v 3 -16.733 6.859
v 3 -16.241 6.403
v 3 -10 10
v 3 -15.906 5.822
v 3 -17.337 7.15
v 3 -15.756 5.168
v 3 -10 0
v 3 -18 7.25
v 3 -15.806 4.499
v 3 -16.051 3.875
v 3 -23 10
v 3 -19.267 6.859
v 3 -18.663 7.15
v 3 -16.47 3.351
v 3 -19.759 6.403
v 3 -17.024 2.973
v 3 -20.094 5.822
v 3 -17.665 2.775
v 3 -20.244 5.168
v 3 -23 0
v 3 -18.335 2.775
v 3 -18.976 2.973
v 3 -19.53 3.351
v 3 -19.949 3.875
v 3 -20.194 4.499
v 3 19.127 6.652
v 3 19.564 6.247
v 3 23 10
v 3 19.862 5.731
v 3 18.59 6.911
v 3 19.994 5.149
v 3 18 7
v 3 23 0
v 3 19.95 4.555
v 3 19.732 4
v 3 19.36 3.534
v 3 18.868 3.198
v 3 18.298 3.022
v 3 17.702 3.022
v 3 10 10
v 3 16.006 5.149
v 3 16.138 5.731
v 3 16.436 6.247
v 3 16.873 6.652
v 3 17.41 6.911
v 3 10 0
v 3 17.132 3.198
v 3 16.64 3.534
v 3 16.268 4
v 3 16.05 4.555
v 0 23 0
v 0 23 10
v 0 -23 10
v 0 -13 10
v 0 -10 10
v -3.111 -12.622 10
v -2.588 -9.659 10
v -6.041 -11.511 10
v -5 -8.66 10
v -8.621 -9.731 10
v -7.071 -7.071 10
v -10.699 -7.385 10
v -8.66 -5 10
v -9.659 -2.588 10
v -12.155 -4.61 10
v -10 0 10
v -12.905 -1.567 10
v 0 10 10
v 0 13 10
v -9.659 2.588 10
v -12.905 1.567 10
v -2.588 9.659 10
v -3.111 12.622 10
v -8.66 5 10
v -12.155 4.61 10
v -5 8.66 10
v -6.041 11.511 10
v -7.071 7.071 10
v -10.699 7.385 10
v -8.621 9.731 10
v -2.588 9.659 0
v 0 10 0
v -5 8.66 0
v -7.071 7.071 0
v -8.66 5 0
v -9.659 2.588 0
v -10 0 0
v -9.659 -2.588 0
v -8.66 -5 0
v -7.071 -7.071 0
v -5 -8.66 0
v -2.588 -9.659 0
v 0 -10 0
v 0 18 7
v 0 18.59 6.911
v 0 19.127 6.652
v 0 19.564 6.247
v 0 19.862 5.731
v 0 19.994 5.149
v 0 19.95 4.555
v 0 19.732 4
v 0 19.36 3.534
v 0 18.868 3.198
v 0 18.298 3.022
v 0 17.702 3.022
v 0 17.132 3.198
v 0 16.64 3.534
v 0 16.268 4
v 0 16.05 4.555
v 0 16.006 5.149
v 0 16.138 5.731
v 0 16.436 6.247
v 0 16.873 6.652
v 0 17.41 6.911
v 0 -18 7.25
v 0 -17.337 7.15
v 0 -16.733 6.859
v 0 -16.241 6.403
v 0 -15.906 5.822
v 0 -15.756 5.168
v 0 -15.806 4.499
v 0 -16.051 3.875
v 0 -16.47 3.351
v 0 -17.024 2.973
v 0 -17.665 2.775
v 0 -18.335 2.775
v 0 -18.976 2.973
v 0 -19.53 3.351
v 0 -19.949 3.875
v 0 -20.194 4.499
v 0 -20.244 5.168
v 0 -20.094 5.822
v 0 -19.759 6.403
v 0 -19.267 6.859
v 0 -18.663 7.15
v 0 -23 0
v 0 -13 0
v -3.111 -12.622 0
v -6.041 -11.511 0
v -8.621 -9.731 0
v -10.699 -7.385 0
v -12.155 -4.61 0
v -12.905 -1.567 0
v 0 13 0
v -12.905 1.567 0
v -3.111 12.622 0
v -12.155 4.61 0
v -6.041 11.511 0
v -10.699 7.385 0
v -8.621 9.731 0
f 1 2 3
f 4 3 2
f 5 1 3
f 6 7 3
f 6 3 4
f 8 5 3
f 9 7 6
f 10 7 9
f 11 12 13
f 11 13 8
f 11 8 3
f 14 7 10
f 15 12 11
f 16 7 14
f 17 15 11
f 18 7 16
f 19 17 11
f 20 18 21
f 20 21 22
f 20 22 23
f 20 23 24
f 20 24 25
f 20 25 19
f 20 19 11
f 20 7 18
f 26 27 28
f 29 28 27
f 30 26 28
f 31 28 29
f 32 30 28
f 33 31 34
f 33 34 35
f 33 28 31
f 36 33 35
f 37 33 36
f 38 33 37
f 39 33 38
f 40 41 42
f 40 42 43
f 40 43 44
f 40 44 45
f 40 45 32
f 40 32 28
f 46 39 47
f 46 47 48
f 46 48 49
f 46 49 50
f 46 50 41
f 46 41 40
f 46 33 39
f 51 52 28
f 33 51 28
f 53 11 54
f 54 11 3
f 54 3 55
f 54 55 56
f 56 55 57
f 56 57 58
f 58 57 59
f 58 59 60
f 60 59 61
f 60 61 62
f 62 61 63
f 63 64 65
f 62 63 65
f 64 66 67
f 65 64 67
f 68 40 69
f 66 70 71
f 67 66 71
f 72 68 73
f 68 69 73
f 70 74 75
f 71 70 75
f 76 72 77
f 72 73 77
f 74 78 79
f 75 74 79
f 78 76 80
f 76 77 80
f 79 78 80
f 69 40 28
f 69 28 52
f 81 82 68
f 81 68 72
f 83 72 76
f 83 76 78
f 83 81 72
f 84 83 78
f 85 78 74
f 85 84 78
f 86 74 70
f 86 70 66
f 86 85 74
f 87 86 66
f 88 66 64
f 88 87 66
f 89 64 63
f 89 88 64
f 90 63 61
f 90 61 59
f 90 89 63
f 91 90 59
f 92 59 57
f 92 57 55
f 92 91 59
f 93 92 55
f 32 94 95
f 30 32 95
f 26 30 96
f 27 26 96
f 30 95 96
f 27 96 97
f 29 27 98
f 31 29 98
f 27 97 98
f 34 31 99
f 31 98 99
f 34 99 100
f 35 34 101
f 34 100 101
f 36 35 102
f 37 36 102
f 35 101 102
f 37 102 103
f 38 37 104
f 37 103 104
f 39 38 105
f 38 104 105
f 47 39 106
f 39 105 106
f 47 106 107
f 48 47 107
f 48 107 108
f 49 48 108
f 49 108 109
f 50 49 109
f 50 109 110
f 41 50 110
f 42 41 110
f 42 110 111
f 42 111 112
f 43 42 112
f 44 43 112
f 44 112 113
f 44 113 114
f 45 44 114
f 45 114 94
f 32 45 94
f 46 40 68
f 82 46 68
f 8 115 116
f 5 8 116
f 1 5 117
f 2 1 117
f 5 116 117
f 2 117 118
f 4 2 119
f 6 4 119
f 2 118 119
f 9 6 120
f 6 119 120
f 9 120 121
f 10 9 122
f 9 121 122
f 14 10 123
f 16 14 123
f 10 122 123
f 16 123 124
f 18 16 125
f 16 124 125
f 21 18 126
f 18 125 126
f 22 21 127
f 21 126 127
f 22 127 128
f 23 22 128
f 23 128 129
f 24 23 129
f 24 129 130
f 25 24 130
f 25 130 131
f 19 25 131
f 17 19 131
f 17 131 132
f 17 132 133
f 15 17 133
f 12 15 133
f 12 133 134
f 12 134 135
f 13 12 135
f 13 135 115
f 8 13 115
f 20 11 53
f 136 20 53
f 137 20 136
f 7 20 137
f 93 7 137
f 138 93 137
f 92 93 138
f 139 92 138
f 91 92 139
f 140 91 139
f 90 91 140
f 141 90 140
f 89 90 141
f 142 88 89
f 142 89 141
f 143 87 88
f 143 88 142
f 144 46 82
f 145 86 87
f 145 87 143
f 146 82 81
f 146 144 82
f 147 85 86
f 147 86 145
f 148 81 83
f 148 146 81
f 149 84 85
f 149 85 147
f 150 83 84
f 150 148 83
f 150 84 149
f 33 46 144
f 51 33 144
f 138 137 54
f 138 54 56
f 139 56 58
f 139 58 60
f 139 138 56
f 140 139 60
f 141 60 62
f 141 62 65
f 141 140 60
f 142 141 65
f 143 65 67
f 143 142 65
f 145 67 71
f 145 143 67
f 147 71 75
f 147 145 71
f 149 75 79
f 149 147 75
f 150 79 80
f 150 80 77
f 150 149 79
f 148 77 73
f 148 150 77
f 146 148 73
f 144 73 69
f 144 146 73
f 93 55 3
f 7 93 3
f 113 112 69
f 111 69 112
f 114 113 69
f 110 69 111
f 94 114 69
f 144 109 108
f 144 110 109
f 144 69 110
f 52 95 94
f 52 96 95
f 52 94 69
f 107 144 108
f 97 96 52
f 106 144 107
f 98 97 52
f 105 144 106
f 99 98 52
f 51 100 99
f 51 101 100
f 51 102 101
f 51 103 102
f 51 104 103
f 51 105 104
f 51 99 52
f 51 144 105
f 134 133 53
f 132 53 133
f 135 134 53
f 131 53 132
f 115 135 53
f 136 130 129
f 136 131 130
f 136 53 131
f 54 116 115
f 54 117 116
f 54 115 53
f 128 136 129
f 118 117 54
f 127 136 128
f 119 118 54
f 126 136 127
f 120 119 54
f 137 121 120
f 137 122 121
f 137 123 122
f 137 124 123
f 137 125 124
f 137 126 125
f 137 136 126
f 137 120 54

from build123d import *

# Parameters (mm, degrees)
EXTRUDE_1_DEPTH     = 10
SKETCH_3_R          = 2
CUT_EXTRUDE_2_DEPTH = 4
SKETCH_4_R          = 2.25
CUT_EXTRUDE_3_DEPTH = 3.2


with BuildPart() as part:
    # 草图1 → 凸台-拉伸1 (new body)
    with BuildSketch(Plane.XY):
        with BuildLine():
            Line((0, 23), (3, 23))
            Line((3, 23), (3, 10))
            Line((3, 10), (0, 10))
            ThreePointArc((0, 10), (-10, 0), (0, -10))
            Line((0, -10), (3, -10))
            Line((3, -10), (3, -23))
            Line((3, -23), (0, -23))
            Line((0, -23), (0, -13))
            ThreePointArc((0, -13), (-13, 0), (0, 13))
            Line((0, 13), (0, 23))
        make_face()
    extrude(amount=EXTRUDE_1_DEPTH)

    # 草图3 → 切除-拉伸2 (cut, through all)
    with BuildSketch(Plane.ZY):
        with Locations((5, 18)):
            Circle(SKETCH_3_R)
    extrude(amount=-CUT_EXTRUDE_2_DEPTH, mode=Mode.SUBTRACT)

    # 草图4 → 切除-拉伸3 (cut)
    with BuildSketch(Plane.ZY):
        with Locations((5, -18)):
            Circle(SKETCH_4_R)
    extrude(amount=-CUT_EXTRUDE_3_DEPTH, mode=Mode.SUBTRACT)


solid = part.part
